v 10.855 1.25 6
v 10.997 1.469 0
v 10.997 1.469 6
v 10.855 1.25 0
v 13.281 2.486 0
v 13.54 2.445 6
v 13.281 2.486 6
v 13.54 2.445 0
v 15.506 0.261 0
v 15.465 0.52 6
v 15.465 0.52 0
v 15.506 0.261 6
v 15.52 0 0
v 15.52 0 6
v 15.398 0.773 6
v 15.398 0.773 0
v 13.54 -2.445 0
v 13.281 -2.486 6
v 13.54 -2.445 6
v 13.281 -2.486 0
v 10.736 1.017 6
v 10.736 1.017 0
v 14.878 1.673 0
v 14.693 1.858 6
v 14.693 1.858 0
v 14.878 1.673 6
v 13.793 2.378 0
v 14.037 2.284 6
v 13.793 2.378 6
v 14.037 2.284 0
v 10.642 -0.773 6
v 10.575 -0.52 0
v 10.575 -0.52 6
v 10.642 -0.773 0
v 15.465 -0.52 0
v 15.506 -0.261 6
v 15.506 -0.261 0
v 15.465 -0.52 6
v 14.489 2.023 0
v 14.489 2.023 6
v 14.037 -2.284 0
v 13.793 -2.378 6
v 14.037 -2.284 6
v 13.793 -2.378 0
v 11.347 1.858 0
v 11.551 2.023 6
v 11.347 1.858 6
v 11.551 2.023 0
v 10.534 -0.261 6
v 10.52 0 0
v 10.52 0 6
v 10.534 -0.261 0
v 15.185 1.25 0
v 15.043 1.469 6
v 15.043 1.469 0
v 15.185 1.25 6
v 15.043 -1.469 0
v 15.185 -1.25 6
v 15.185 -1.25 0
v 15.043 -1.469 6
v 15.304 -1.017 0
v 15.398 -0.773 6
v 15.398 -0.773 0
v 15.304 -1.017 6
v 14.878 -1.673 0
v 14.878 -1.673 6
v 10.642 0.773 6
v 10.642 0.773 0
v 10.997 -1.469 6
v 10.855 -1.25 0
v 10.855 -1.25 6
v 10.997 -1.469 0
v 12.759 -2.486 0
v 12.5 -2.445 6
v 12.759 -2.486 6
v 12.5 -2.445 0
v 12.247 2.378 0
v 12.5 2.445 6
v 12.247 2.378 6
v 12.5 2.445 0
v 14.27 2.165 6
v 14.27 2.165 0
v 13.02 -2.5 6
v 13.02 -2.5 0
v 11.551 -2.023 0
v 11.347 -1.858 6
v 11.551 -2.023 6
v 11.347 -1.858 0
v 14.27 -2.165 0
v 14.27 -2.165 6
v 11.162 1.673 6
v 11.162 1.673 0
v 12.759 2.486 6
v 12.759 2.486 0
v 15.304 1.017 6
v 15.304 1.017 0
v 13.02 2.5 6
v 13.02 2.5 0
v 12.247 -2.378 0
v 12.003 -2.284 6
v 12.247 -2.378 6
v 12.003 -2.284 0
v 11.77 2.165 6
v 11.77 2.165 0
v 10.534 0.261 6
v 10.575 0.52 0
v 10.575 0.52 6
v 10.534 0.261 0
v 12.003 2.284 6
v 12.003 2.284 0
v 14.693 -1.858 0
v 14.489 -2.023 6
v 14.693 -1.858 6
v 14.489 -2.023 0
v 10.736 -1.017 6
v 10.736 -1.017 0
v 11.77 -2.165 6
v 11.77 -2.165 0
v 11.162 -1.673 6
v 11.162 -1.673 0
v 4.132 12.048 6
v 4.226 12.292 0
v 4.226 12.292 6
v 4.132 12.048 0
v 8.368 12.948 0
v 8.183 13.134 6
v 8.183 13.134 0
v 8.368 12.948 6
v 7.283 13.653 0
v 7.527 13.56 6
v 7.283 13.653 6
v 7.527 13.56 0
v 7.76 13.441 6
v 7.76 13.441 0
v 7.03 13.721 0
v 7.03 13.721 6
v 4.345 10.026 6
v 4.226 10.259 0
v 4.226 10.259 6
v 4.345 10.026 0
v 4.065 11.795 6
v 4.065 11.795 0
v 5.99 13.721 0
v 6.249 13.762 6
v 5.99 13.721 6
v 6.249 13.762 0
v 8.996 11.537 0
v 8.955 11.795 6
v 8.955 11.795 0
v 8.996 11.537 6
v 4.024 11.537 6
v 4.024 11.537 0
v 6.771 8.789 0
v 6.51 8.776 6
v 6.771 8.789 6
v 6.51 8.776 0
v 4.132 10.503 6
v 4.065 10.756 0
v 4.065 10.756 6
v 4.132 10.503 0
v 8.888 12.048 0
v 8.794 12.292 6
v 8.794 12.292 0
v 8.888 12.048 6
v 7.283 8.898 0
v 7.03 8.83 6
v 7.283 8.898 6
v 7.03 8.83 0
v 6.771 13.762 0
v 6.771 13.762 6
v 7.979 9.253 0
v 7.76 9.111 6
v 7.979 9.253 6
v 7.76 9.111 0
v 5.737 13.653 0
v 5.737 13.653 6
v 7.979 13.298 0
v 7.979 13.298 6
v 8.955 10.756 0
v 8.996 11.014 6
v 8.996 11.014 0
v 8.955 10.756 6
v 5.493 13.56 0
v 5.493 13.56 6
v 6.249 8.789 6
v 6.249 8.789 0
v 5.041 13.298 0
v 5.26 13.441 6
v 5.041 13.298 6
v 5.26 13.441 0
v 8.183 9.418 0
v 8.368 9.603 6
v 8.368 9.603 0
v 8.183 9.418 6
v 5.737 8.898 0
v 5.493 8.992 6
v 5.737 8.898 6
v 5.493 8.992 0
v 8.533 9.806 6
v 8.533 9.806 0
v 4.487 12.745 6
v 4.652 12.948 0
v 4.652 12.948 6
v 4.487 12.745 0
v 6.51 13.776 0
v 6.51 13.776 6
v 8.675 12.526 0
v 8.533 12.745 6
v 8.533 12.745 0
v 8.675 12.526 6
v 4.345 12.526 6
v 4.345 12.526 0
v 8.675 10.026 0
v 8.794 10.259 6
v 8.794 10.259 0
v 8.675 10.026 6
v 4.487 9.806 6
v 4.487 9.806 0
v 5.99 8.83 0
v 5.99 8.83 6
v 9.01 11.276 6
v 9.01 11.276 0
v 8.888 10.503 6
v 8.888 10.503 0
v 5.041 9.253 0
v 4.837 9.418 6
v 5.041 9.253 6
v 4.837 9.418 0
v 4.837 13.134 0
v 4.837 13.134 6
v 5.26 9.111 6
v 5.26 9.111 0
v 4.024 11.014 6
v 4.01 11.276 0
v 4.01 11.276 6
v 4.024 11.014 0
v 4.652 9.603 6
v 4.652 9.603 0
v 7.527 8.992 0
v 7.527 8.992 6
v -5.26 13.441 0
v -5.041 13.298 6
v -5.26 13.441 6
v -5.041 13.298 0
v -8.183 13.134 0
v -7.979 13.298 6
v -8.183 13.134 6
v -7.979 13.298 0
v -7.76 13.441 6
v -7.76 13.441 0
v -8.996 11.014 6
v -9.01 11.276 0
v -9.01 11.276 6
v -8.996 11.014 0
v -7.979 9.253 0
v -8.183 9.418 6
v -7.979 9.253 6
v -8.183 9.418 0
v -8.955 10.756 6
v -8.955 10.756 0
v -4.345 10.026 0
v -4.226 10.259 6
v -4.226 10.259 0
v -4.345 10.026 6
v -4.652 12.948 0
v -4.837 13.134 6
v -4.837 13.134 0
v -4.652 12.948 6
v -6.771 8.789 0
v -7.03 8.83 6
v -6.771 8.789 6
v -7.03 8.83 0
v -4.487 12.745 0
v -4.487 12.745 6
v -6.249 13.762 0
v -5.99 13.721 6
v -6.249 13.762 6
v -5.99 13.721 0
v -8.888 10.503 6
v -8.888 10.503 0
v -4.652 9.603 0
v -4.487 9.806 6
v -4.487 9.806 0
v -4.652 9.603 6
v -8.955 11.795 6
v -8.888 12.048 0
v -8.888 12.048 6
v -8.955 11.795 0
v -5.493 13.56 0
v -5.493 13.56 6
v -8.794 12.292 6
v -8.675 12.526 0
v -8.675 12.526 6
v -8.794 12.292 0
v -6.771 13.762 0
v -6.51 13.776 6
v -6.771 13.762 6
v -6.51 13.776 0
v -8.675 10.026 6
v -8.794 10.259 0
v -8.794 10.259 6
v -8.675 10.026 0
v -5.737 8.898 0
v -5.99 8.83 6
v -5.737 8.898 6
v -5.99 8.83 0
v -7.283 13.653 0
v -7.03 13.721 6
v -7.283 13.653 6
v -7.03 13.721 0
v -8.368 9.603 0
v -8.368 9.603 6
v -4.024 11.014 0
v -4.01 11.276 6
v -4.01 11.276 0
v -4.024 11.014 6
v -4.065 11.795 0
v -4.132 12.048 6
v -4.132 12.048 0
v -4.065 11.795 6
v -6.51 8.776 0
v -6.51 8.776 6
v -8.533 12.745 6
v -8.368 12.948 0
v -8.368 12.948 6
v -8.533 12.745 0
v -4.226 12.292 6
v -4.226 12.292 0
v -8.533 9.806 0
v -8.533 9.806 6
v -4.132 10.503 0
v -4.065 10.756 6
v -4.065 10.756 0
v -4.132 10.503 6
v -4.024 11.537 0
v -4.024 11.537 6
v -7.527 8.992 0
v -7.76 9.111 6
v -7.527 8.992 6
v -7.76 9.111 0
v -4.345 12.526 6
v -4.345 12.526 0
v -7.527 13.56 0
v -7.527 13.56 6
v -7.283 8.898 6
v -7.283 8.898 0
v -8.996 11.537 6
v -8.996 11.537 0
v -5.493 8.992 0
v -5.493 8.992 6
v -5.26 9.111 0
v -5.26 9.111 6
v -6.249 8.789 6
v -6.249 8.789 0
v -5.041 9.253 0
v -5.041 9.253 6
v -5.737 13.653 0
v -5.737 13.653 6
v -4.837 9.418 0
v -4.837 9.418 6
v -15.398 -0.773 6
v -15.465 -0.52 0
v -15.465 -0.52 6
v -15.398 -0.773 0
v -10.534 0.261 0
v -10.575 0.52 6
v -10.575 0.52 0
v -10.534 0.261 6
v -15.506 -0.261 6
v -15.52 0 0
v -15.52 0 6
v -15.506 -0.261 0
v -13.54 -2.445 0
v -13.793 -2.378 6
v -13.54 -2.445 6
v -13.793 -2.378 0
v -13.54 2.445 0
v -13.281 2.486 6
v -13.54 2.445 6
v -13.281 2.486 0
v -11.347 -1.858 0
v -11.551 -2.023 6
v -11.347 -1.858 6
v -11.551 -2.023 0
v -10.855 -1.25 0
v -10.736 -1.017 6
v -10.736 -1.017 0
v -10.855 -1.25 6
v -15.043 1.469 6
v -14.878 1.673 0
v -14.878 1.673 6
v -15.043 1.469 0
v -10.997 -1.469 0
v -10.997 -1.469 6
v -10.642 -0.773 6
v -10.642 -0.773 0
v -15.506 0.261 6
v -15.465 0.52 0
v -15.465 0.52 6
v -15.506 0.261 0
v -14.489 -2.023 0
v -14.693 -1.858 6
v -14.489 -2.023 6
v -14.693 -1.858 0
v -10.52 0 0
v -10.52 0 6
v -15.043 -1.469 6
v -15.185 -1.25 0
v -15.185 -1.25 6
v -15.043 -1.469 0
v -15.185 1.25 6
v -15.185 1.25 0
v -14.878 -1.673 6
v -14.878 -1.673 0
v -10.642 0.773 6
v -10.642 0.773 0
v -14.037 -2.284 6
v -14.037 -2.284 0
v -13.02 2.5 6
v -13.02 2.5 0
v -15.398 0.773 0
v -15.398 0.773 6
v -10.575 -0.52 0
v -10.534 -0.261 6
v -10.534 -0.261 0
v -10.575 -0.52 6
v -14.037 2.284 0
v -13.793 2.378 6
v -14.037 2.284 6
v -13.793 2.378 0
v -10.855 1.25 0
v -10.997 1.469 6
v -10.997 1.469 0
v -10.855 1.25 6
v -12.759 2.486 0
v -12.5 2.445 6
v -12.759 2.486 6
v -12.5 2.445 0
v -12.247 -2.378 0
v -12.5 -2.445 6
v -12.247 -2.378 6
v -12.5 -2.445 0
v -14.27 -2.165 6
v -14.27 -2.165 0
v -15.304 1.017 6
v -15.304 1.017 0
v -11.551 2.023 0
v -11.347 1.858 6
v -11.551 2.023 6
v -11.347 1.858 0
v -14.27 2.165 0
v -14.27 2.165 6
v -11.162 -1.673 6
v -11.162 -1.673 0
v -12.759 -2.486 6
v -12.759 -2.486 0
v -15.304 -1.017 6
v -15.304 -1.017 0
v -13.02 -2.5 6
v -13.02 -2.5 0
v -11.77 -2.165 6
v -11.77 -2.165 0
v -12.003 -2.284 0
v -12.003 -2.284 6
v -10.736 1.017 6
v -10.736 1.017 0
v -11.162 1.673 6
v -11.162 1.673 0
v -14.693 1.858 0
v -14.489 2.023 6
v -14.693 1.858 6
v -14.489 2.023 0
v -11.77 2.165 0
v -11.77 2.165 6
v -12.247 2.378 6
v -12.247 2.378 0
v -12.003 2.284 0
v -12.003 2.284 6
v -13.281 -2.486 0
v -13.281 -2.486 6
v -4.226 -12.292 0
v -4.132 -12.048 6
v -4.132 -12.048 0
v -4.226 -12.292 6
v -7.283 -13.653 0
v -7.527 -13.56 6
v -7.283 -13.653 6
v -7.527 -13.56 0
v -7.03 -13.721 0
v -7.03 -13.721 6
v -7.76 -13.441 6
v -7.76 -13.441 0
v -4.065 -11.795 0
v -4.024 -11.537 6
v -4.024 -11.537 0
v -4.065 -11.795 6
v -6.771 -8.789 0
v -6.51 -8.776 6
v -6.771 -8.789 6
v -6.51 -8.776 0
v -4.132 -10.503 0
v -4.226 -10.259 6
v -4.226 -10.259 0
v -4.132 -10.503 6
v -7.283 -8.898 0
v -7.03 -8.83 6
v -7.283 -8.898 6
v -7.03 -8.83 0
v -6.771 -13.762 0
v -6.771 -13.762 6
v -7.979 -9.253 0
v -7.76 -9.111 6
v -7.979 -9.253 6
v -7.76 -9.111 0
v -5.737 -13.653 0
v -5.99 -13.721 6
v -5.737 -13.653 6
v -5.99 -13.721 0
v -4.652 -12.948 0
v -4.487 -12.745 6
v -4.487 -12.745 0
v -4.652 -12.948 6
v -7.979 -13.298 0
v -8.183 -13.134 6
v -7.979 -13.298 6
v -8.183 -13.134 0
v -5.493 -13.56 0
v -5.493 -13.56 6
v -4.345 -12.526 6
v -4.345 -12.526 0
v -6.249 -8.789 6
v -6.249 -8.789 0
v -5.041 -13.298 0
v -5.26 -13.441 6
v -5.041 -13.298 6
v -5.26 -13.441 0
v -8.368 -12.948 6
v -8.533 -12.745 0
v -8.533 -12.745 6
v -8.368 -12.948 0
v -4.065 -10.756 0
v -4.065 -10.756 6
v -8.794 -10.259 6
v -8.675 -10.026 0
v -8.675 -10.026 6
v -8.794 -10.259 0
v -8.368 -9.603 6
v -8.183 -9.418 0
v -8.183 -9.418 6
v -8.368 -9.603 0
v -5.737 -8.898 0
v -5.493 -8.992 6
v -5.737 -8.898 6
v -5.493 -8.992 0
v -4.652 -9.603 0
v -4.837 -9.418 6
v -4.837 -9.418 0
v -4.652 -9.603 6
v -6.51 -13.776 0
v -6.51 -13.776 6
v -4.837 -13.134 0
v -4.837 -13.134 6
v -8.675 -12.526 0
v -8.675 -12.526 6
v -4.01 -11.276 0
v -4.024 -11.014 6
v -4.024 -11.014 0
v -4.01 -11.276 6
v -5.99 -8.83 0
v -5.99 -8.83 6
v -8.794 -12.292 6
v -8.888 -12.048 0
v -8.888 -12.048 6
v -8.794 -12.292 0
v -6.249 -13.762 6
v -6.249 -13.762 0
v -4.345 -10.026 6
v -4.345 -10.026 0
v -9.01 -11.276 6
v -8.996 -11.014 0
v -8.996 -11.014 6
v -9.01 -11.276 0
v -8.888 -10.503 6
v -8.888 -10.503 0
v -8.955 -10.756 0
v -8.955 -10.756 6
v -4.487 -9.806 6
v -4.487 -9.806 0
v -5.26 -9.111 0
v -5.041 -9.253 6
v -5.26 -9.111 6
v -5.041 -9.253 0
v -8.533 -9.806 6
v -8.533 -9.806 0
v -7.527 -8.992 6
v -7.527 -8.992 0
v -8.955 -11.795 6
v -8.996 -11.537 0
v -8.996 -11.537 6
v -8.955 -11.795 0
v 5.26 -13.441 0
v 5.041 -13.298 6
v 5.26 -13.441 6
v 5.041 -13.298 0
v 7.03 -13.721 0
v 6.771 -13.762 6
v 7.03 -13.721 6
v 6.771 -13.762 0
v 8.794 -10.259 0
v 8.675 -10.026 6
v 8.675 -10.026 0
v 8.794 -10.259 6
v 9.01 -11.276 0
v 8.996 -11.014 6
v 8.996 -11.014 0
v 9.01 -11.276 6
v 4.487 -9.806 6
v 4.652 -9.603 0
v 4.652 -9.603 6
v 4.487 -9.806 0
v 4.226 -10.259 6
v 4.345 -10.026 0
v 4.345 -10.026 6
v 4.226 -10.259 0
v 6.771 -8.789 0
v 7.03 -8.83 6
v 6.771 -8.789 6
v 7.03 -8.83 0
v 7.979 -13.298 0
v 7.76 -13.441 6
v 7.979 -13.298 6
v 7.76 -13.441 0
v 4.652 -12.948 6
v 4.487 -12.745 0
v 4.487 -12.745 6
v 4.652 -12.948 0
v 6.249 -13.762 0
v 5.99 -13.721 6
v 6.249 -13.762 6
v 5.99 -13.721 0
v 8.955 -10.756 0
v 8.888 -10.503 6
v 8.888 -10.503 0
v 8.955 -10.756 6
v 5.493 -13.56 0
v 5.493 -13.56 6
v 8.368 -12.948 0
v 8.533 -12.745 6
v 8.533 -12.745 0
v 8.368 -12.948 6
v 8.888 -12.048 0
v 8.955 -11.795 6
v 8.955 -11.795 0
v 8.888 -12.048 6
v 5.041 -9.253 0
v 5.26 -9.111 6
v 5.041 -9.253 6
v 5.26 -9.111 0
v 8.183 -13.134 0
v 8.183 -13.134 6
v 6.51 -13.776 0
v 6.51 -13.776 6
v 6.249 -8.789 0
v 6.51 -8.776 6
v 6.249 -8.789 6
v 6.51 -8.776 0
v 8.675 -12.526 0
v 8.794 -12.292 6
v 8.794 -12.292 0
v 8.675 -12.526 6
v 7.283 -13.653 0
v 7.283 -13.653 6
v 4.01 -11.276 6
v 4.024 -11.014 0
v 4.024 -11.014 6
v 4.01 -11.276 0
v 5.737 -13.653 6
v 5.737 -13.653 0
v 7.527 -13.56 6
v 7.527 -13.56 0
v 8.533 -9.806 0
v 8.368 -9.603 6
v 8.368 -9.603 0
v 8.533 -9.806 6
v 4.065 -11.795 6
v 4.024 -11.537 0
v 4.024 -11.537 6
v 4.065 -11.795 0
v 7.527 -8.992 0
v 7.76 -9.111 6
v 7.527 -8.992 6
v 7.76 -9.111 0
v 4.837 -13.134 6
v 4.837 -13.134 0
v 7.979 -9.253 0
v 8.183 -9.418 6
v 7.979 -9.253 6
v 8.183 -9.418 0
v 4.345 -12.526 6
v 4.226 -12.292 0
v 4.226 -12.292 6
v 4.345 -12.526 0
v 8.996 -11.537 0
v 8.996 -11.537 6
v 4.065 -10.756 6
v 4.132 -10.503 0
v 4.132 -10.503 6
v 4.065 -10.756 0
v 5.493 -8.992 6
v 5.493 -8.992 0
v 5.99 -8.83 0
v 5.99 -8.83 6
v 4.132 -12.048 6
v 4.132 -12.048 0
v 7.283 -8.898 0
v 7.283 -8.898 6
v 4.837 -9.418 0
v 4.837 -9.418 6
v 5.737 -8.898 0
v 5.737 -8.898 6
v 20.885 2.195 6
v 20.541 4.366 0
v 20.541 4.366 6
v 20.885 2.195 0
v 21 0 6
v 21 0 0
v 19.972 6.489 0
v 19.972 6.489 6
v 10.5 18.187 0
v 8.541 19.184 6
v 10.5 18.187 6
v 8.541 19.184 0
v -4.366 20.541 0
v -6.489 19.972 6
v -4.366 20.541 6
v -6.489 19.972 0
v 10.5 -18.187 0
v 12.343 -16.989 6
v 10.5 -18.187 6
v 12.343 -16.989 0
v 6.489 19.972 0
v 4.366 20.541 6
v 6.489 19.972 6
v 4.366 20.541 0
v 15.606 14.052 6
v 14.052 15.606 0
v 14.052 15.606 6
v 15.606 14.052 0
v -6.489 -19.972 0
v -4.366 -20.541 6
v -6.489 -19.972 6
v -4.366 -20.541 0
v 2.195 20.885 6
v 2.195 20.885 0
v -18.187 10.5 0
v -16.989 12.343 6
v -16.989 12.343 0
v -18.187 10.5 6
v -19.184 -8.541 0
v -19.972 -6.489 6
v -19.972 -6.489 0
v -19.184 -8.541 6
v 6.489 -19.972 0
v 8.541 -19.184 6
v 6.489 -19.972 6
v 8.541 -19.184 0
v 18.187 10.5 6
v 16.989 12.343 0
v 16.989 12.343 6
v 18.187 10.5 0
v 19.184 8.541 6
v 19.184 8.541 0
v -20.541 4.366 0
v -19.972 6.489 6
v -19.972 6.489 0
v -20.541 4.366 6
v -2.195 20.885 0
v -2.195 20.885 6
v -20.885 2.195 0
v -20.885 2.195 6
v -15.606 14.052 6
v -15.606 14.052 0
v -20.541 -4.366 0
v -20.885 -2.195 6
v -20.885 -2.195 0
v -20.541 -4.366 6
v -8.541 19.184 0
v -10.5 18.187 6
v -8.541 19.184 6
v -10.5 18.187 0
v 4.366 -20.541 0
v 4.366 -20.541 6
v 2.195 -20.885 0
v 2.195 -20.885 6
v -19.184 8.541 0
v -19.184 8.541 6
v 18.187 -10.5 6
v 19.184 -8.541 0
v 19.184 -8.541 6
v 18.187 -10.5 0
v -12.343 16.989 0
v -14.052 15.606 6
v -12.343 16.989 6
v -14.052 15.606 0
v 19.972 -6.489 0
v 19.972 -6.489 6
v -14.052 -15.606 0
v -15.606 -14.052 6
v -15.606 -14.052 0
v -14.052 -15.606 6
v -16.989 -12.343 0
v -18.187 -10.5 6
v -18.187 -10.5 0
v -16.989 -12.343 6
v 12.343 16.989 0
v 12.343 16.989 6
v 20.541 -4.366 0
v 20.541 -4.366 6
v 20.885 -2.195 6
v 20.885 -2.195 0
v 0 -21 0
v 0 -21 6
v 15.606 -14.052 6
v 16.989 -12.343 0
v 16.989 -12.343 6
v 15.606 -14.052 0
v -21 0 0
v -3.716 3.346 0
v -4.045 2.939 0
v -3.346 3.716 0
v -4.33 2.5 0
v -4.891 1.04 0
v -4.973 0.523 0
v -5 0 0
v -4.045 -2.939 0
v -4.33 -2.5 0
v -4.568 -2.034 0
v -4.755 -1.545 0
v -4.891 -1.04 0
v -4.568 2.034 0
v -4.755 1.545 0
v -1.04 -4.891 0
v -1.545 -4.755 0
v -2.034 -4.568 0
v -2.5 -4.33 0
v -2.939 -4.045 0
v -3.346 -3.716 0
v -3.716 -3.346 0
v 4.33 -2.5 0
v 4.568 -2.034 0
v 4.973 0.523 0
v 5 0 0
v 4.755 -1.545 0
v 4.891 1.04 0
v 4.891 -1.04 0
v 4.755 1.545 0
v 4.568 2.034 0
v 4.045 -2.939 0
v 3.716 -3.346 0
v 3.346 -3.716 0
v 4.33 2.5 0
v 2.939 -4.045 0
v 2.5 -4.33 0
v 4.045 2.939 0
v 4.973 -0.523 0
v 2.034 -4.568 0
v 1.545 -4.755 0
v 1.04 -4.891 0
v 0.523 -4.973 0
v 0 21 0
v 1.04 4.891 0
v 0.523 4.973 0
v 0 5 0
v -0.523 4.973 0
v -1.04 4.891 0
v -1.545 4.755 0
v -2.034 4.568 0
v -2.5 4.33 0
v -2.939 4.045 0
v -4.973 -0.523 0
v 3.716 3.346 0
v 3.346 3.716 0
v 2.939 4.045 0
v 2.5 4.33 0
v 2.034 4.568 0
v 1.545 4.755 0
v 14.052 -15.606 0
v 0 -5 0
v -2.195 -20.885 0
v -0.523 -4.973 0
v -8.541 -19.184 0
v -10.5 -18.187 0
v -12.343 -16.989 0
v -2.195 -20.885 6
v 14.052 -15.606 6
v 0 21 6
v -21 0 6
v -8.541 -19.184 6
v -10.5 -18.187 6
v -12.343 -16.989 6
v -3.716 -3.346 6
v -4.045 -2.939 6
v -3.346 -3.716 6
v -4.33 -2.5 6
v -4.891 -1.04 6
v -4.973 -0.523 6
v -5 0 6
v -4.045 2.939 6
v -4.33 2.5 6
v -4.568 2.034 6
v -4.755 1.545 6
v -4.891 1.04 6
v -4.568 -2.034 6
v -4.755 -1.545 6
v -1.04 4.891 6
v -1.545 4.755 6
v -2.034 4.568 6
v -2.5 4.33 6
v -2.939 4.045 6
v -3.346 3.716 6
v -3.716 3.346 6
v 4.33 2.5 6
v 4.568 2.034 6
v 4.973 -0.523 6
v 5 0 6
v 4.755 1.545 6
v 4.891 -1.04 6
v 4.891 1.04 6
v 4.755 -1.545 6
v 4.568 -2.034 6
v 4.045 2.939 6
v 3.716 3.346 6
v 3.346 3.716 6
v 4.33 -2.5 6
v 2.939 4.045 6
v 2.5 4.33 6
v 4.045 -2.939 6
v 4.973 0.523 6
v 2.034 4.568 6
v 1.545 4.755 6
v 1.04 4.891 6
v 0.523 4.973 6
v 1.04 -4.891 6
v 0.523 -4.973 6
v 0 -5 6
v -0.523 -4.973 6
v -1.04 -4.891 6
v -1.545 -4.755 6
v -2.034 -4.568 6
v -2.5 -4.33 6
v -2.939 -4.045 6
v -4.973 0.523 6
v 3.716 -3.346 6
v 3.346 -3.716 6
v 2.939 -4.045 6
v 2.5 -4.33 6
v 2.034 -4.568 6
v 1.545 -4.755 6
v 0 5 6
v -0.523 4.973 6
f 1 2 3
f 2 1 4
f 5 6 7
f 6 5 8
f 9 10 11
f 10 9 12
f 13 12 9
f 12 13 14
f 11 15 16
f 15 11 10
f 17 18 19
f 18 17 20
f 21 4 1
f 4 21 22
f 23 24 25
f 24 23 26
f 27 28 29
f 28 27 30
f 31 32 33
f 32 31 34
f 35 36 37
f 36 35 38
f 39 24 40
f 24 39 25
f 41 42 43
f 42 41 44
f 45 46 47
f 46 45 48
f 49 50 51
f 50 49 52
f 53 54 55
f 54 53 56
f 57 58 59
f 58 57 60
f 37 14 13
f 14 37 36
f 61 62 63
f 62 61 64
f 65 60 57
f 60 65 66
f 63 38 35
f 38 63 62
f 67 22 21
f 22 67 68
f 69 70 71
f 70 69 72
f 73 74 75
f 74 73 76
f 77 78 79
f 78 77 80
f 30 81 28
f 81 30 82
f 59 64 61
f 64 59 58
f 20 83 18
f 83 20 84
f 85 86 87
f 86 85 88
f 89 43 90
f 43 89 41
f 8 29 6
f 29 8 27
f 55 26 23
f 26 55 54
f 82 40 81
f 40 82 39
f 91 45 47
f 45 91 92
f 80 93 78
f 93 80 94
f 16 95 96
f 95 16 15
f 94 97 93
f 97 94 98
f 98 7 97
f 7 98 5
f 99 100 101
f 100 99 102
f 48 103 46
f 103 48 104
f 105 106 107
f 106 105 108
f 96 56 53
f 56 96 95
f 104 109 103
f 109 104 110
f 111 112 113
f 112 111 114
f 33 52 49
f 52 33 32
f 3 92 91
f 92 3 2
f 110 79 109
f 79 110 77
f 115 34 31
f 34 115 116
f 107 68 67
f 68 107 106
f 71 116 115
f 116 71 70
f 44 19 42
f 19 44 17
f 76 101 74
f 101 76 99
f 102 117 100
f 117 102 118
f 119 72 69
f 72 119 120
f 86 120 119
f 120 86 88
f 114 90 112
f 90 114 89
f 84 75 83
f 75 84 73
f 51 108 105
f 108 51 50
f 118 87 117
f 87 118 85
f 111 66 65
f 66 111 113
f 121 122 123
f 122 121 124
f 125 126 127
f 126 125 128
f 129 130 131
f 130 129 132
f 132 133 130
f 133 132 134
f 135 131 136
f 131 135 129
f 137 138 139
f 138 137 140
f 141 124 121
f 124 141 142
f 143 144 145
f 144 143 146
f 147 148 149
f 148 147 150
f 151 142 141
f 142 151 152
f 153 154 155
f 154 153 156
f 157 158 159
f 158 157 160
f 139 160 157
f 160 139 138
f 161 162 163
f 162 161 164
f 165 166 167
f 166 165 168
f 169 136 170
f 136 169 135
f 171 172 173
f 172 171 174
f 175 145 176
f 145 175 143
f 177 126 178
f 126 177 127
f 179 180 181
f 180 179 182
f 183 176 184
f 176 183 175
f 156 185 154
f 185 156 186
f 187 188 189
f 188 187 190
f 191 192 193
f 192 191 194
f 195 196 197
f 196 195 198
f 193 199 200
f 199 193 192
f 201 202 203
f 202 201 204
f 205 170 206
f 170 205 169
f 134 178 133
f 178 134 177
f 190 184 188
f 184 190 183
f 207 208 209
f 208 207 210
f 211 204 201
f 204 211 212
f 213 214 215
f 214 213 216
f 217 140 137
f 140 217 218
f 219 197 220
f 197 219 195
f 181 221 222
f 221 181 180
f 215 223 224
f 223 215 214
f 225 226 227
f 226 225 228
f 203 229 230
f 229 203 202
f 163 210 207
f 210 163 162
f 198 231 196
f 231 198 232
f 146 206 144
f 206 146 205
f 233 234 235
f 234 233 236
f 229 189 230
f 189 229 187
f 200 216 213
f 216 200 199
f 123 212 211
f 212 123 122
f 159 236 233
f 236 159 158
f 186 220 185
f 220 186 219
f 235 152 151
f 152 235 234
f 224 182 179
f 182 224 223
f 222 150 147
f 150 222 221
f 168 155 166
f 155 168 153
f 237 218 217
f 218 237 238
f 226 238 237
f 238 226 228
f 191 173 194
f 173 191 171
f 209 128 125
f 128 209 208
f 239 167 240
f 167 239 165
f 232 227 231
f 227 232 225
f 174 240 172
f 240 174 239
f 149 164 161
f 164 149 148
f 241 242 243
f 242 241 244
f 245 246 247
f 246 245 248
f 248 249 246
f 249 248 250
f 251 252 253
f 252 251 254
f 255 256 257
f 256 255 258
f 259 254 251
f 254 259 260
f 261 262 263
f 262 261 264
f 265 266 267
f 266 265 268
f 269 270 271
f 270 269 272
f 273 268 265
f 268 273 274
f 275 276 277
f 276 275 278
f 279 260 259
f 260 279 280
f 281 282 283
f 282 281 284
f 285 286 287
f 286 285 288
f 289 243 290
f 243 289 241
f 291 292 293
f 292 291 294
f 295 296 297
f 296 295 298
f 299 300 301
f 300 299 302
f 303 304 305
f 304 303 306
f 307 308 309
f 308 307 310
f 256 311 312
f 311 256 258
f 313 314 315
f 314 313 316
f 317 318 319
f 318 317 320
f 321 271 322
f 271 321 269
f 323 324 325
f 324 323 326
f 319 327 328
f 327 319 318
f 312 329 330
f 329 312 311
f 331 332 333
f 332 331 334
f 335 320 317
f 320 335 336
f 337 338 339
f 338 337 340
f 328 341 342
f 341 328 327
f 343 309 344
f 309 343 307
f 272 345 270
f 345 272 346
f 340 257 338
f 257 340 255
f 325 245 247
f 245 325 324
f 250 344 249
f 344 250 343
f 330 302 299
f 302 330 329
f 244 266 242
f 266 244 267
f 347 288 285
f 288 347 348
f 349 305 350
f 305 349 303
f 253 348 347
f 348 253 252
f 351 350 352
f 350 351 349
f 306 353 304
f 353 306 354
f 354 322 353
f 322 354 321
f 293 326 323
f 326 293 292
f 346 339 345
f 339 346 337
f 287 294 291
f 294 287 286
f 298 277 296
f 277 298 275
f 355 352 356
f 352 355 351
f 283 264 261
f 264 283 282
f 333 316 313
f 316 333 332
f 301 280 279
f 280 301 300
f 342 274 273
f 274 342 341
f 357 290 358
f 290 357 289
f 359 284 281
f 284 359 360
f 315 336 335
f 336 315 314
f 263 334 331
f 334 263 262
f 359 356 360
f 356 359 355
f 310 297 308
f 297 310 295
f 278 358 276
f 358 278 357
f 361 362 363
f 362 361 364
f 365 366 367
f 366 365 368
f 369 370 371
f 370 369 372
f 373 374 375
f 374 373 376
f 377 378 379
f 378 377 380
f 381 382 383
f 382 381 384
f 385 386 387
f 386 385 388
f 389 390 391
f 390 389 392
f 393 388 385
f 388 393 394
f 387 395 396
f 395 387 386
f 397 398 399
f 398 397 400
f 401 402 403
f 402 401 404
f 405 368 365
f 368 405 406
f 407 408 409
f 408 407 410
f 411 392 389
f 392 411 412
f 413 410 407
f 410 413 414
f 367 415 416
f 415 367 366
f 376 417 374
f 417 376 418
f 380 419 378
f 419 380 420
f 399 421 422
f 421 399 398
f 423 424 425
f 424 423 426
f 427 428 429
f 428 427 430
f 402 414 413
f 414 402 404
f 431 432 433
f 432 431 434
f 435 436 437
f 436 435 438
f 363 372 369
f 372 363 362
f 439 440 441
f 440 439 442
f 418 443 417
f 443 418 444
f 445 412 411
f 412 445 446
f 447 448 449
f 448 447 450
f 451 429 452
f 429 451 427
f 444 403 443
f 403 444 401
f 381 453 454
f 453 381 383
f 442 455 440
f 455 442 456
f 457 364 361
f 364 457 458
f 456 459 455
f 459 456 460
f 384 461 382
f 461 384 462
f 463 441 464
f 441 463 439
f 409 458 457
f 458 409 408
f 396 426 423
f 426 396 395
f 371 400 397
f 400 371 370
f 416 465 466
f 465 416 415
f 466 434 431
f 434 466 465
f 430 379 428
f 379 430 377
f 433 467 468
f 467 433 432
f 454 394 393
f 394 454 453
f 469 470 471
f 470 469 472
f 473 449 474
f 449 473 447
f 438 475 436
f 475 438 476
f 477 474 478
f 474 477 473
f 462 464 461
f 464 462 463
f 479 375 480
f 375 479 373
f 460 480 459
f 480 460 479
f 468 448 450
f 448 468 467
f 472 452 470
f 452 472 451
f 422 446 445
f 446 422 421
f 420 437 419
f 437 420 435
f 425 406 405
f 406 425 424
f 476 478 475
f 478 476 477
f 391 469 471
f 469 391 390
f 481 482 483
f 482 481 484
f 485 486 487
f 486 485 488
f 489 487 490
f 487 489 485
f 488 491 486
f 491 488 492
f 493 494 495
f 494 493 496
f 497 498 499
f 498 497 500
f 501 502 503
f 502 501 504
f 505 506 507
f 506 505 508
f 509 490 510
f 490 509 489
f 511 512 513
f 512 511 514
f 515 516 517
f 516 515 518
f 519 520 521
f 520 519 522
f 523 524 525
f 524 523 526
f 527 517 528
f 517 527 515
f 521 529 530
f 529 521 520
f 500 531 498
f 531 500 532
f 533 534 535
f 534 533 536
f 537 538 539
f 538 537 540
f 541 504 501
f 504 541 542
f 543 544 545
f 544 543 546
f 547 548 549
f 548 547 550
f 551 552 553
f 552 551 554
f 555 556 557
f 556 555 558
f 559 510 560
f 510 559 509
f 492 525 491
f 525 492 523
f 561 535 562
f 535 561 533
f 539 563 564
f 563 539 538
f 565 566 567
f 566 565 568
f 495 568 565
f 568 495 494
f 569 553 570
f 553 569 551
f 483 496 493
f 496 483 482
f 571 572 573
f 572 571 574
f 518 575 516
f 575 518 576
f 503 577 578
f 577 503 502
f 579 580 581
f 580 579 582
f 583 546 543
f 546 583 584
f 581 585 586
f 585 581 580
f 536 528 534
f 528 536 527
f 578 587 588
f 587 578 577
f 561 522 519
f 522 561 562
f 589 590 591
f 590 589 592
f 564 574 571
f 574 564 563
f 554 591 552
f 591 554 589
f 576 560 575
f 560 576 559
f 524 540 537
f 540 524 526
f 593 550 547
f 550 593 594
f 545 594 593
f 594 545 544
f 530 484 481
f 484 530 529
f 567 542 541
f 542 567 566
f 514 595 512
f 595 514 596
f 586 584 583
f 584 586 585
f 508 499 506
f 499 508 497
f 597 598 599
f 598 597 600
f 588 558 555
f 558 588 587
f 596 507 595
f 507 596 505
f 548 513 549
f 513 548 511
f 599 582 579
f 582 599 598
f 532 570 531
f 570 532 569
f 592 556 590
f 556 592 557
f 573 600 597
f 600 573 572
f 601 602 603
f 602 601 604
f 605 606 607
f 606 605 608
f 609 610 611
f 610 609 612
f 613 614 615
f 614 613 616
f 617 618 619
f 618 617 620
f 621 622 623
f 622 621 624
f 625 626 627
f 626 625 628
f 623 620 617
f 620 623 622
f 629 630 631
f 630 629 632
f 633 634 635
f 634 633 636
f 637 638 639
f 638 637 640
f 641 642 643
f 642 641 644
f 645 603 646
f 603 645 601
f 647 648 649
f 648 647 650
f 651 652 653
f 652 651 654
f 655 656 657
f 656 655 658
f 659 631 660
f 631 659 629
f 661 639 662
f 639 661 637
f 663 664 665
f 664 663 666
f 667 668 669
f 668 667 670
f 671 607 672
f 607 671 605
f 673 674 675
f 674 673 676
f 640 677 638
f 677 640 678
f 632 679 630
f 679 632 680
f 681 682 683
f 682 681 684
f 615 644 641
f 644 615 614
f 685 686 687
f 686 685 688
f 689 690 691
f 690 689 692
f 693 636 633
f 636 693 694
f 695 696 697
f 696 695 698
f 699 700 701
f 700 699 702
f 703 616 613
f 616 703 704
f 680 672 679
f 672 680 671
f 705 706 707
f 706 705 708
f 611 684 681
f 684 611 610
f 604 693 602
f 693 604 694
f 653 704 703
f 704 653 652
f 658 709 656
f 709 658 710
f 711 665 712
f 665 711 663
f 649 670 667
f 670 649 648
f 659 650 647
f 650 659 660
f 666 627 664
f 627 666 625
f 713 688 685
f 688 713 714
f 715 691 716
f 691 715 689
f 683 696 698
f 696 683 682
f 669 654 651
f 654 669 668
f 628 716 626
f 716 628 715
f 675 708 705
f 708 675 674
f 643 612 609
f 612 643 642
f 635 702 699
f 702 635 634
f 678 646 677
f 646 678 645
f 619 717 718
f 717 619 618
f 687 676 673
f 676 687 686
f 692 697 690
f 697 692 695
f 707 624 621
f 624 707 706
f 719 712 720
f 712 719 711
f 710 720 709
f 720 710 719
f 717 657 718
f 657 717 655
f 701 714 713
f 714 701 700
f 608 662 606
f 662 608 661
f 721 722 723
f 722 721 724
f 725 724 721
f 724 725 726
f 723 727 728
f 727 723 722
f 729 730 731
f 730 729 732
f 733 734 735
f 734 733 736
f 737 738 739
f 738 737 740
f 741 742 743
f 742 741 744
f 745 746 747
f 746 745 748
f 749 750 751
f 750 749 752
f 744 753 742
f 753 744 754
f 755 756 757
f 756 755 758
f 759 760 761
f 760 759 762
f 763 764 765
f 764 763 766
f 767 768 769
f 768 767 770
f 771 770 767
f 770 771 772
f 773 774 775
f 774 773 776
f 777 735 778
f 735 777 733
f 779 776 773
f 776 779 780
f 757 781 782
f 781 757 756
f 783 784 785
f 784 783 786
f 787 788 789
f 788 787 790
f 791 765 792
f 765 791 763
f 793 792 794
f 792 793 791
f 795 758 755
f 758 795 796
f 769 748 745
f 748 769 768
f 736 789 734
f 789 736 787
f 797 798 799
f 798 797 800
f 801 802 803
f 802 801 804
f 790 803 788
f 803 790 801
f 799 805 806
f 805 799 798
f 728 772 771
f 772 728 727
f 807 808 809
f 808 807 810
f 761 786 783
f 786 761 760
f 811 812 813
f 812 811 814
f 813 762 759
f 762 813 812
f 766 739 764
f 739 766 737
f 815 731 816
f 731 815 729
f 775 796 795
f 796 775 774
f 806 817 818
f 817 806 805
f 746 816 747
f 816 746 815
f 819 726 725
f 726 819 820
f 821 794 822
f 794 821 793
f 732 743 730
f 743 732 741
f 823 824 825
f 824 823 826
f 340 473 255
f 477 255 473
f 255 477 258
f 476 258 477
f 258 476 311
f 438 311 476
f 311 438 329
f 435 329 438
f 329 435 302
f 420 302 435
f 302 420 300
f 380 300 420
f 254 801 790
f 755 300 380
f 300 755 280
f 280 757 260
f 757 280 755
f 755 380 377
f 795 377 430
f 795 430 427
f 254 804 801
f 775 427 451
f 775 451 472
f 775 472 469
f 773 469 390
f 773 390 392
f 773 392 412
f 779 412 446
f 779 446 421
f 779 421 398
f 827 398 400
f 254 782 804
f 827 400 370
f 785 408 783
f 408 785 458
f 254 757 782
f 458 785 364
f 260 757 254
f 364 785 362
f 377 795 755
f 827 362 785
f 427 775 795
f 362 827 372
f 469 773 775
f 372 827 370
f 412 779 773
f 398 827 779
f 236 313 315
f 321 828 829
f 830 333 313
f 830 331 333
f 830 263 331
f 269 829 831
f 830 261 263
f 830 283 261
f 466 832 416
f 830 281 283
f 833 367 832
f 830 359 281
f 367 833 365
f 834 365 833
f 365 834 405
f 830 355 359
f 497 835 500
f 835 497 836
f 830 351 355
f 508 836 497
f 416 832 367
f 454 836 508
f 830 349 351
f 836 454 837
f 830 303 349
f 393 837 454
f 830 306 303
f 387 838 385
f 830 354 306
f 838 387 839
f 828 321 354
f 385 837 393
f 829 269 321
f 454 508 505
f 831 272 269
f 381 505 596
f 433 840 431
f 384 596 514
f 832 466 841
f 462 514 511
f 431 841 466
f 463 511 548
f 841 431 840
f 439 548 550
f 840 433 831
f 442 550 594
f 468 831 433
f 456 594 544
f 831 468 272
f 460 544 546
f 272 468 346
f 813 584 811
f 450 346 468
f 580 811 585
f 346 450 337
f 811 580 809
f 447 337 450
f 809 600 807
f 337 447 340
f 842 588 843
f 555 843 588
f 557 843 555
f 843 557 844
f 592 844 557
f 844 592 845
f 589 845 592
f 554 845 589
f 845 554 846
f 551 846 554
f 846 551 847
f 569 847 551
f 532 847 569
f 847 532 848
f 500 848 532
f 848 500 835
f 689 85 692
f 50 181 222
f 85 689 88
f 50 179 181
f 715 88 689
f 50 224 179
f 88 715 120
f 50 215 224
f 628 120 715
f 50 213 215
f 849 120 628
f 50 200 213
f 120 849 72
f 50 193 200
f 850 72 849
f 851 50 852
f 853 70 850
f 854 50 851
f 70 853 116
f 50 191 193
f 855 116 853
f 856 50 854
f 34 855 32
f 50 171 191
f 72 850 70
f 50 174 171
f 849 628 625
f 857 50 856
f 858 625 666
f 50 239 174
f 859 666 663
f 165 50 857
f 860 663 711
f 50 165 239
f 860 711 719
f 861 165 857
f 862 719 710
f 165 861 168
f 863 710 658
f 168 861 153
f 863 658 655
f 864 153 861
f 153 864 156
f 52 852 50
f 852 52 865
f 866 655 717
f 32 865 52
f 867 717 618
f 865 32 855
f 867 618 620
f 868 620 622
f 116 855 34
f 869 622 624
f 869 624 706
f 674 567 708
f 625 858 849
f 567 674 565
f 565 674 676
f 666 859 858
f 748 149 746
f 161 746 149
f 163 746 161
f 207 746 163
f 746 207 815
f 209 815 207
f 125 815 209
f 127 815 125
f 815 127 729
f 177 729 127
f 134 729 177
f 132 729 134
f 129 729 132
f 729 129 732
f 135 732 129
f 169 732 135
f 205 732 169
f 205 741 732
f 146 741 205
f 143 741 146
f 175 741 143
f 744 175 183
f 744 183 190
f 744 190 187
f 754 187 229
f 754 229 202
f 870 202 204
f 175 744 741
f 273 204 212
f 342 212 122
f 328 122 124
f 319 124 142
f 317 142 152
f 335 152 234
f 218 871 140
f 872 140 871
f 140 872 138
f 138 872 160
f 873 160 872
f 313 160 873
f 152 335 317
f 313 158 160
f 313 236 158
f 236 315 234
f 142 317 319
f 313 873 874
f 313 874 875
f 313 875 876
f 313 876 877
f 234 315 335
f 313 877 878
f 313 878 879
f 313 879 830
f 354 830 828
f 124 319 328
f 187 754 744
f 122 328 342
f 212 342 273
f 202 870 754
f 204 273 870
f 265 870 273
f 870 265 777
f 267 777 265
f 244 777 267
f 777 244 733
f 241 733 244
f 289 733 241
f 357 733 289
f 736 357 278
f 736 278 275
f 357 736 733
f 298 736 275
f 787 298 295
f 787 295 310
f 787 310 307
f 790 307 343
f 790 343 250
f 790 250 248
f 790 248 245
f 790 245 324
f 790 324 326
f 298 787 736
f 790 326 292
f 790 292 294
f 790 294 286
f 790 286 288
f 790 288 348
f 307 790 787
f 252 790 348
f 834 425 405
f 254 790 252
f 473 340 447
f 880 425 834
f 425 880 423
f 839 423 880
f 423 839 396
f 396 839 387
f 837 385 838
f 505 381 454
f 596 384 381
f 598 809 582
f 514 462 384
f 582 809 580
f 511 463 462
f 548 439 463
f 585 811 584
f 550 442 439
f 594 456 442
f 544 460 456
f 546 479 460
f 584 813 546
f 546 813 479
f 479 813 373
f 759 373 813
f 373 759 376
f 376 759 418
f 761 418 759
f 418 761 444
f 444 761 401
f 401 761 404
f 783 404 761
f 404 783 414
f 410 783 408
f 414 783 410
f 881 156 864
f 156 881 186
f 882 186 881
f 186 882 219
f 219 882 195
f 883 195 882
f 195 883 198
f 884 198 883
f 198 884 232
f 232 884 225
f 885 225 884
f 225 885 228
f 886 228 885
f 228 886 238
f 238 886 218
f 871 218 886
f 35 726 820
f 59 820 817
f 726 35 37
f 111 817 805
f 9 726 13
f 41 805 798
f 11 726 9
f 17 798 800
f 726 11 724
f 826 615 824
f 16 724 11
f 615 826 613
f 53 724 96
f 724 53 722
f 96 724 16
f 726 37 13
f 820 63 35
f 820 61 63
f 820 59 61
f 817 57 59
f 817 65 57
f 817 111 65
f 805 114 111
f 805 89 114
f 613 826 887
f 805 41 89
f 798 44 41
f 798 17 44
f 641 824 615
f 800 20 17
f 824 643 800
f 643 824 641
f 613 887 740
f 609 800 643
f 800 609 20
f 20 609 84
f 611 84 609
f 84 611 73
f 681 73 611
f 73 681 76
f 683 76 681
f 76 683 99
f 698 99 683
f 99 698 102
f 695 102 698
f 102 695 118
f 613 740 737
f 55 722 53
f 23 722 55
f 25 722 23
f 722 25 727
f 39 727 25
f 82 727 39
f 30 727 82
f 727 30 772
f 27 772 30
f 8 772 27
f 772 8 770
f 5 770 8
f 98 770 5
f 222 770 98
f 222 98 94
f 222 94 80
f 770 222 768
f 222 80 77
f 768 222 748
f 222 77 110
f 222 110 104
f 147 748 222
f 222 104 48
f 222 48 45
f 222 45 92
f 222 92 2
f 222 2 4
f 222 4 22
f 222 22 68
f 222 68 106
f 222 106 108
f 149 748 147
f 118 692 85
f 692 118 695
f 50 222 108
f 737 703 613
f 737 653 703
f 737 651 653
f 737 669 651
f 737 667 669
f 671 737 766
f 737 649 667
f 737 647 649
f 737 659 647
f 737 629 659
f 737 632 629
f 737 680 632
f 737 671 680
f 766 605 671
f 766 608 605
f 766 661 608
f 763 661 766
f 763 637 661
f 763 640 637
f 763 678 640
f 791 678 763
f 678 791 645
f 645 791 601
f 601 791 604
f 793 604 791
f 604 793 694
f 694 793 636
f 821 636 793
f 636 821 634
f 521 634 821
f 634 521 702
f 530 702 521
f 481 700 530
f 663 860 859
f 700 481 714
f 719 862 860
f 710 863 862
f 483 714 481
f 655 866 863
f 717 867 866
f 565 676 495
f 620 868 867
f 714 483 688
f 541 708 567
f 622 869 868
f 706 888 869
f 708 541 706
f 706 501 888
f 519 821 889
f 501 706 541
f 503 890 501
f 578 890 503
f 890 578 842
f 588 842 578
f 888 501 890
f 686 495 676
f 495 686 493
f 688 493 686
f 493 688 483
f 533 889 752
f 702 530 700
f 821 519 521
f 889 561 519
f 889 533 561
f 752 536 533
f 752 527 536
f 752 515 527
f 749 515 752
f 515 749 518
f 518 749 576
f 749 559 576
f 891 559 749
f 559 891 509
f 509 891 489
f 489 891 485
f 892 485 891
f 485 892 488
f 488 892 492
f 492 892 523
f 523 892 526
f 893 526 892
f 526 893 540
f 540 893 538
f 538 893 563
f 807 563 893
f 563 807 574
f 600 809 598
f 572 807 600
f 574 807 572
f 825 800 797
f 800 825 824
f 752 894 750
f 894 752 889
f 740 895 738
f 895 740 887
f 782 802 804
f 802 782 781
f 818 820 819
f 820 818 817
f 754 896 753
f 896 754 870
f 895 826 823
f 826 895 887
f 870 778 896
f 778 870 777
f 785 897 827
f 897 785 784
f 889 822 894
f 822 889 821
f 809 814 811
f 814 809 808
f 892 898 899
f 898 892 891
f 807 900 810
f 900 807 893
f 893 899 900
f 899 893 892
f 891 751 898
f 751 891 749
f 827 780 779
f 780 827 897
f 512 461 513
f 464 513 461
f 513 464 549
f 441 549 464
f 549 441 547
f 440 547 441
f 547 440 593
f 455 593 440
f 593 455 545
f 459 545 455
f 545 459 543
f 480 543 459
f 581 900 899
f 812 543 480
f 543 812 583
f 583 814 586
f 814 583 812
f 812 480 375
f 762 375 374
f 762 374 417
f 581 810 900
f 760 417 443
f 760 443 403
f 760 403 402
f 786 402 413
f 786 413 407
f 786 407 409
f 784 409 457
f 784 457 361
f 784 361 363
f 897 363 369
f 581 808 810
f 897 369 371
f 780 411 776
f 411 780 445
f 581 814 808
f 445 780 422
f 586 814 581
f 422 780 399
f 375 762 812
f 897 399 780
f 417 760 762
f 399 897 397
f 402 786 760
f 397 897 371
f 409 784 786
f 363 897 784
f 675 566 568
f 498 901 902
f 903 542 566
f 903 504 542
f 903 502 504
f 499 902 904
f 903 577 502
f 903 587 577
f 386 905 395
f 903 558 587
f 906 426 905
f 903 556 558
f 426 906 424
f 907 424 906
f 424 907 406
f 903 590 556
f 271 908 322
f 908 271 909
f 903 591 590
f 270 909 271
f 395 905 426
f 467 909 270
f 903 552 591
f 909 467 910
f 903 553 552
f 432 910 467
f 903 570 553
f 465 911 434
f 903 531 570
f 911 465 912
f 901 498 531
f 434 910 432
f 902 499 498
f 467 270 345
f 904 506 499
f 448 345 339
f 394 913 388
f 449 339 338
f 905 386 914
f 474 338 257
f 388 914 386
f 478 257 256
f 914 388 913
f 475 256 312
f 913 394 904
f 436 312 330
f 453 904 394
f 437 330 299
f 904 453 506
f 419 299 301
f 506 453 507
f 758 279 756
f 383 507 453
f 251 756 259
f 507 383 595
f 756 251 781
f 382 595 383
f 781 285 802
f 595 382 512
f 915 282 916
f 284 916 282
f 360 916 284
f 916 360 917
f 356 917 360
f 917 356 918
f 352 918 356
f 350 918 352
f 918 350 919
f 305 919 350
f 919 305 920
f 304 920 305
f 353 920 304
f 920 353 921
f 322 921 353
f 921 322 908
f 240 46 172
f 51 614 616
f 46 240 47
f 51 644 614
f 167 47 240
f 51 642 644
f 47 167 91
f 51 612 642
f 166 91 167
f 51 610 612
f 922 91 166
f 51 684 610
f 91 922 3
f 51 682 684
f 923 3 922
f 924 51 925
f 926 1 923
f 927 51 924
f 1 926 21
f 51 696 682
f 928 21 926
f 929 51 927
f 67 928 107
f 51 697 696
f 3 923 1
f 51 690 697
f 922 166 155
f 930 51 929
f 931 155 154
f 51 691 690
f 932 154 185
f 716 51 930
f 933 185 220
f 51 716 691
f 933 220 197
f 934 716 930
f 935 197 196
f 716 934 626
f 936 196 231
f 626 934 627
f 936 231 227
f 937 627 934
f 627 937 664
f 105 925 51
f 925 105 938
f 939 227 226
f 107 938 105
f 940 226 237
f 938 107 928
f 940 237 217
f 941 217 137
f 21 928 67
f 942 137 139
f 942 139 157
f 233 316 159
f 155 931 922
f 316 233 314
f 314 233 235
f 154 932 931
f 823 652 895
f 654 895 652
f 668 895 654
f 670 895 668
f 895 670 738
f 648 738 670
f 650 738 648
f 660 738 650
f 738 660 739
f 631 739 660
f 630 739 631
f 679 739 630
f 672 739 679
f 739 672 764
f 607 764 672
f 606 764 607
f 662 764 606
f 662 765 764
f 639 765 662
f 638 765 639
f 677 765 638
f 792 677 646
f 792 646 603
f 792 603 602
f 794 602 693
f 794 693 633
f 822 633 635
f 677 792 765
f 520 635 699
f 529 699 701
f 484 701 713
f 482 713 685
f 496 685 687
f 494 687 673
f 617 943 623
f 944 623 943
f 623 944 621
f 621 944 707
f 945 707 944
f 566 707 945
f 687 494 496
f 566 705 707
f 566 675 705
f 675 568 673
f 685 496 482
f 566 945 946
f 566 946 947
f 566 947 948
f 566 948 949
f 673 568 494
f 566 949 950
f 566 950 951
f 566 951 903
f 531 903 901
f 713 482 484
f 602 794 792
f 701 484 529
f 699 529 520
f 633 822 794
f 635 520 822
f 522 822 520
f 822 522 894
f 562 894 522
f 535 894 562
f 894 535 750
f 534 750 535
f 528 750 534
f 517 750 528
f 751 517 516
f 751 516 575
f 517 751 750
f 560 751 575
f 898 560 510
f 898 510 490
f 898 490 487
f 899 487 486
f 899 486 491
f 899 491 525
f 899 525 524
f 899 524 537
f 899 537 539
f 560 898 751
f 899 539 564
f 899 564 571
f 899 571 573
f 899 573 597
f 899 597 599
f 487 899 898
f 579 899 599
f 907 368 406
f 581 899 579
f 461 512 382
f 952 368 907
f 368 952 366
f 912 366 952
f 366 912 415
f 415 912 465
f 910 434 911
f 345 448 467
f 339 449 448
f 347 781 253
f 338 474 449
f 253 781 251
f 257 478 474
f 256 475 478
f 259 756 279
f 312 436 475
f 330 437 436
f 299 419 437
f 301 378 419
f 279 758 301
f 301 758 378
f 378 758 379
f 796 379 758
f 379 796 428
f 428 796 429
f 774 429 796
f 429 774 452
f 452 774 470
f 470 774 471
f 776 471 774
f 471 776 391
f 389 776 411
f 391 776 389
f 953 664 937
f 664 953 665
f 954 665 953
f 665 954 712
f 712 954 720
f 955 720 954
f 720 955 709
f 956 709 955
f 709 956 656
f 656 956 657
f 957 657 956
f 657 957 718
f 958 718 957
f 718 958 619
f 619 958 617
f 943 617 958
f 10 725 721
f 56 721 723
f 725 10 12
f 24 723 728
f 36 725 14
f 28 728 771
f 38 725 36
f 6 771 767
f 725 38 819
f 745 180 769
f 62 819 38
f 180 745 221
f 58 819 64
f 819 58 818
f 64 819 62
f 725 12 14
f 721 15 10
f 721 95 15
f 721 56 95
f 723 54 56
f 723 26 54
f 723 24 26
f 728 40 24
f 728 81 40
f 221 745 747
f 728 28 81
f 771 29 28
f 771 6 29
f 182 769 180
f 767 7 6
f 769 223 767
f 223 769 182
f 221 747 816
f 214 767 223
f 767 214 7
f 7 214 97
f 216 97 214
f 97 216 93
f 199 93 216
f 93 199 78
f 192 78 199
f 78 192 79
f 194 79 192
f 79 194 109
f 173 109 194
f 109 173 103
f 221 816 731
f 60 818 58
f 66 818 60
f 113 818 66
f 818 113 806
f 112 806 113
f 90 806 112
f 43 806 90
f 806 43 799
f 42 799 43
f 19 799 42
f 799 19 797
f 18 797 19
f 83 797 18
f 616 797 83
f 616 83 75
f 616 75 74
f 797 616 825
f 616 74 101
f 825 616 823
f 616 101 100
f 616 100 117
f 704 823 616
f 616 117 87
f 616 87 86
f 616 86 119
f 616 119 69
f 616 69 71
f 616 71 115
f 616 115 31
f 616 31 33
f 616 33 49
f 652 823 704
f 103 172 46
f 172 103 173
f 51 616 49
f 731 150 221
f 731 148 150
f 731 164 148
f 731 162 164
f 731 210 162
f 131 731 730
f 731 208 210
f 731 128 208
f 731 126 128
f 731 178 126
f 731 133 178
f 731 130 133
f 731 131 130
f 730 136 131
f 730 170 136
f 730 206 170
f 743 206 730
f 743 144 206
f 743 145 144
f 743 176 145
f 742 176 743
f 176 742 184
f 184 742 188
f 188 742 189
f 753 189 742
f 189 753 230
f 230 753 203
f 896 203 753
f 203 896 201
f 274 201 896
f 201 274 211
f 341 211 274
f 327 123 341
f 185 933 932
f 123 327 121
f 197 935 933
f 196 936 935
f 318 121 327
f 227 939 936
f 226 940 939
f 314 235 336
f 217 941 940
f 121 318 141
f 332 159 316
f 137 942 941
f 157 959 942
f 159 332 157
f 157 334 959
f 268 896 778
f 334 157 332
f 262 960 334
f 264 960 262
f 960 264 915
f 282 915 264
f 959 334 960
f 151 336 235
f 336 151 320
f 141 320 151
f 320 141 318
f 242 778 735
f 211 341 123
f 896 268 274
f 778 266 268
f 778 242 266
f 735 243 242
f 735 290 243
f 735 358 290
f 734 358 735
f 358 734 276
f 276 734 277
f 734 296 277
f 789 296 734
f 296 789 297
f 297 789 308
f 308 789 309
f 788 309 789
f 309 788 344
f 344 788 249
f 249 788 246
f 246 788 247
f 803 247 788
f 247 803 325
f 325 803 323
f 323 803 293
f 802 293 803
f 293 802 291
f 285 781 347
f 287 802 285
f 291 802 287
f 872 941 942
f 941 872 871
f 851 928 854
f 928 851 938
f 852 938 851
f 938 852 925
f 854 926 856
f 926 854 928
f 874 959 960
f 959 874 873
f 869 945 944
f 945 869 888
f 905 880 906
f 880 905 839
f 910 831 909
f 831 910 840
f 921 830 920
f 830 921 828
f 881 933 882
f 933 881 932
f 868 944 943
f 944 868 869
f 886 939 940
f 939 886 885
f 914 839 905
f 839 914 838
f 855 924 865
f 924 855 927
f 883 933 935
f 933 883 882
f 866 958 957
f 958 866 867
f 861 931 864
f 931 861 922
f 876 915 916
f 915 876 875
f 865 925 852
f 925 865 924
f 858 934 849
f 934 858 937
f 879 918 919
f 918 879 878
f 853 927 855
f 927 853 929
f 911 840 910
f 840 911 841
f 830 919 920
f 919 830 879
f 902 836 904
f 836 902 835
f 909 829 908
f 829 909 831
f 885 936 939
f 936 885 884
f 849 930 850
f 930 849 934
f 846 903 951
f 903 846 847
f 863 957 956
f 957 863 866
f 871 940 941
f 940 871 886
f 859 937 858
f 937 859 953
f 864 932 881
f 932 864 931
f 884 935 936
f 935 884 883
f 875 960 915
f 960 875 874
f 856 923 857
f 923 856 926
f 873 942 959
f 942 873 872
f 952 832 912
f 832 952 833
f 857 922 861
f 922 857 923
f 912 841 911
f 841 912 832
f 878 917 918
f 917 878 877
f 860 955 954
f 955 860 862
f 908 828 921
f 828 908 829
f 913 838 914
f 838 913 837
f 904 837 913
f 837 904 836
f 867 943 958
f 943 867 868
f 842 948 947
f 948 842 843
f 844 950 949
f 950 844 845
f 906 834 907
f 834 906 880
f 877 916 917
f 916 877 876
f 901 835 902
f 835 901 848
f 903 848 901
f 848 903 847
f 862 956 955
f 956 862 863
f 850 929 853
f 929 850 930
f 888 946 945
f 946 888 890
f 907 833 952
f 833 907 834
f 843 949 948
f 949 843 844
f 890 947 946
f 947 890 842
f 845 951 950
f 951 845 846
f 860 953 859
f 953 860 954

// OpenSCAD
// Lightweight sprocket blank.
$fn = 60;
eps = 0.02;
bore_d = 10;
outer_d = 42;
spoke_holes = 6;
thickness = 6;
difference() { cylinder(d=outer_d,h=thickness); translate([0,0,-eps]) cylinder(d=bore_d,h=thickness+2*eps); for(i=[0:spoke_holes-1]) rotate([0,0,i*360/spoke_holes]) translate([outer_d*0.31,0,-eps]) cylinder(d=5,h=thickness+2*eps); }
